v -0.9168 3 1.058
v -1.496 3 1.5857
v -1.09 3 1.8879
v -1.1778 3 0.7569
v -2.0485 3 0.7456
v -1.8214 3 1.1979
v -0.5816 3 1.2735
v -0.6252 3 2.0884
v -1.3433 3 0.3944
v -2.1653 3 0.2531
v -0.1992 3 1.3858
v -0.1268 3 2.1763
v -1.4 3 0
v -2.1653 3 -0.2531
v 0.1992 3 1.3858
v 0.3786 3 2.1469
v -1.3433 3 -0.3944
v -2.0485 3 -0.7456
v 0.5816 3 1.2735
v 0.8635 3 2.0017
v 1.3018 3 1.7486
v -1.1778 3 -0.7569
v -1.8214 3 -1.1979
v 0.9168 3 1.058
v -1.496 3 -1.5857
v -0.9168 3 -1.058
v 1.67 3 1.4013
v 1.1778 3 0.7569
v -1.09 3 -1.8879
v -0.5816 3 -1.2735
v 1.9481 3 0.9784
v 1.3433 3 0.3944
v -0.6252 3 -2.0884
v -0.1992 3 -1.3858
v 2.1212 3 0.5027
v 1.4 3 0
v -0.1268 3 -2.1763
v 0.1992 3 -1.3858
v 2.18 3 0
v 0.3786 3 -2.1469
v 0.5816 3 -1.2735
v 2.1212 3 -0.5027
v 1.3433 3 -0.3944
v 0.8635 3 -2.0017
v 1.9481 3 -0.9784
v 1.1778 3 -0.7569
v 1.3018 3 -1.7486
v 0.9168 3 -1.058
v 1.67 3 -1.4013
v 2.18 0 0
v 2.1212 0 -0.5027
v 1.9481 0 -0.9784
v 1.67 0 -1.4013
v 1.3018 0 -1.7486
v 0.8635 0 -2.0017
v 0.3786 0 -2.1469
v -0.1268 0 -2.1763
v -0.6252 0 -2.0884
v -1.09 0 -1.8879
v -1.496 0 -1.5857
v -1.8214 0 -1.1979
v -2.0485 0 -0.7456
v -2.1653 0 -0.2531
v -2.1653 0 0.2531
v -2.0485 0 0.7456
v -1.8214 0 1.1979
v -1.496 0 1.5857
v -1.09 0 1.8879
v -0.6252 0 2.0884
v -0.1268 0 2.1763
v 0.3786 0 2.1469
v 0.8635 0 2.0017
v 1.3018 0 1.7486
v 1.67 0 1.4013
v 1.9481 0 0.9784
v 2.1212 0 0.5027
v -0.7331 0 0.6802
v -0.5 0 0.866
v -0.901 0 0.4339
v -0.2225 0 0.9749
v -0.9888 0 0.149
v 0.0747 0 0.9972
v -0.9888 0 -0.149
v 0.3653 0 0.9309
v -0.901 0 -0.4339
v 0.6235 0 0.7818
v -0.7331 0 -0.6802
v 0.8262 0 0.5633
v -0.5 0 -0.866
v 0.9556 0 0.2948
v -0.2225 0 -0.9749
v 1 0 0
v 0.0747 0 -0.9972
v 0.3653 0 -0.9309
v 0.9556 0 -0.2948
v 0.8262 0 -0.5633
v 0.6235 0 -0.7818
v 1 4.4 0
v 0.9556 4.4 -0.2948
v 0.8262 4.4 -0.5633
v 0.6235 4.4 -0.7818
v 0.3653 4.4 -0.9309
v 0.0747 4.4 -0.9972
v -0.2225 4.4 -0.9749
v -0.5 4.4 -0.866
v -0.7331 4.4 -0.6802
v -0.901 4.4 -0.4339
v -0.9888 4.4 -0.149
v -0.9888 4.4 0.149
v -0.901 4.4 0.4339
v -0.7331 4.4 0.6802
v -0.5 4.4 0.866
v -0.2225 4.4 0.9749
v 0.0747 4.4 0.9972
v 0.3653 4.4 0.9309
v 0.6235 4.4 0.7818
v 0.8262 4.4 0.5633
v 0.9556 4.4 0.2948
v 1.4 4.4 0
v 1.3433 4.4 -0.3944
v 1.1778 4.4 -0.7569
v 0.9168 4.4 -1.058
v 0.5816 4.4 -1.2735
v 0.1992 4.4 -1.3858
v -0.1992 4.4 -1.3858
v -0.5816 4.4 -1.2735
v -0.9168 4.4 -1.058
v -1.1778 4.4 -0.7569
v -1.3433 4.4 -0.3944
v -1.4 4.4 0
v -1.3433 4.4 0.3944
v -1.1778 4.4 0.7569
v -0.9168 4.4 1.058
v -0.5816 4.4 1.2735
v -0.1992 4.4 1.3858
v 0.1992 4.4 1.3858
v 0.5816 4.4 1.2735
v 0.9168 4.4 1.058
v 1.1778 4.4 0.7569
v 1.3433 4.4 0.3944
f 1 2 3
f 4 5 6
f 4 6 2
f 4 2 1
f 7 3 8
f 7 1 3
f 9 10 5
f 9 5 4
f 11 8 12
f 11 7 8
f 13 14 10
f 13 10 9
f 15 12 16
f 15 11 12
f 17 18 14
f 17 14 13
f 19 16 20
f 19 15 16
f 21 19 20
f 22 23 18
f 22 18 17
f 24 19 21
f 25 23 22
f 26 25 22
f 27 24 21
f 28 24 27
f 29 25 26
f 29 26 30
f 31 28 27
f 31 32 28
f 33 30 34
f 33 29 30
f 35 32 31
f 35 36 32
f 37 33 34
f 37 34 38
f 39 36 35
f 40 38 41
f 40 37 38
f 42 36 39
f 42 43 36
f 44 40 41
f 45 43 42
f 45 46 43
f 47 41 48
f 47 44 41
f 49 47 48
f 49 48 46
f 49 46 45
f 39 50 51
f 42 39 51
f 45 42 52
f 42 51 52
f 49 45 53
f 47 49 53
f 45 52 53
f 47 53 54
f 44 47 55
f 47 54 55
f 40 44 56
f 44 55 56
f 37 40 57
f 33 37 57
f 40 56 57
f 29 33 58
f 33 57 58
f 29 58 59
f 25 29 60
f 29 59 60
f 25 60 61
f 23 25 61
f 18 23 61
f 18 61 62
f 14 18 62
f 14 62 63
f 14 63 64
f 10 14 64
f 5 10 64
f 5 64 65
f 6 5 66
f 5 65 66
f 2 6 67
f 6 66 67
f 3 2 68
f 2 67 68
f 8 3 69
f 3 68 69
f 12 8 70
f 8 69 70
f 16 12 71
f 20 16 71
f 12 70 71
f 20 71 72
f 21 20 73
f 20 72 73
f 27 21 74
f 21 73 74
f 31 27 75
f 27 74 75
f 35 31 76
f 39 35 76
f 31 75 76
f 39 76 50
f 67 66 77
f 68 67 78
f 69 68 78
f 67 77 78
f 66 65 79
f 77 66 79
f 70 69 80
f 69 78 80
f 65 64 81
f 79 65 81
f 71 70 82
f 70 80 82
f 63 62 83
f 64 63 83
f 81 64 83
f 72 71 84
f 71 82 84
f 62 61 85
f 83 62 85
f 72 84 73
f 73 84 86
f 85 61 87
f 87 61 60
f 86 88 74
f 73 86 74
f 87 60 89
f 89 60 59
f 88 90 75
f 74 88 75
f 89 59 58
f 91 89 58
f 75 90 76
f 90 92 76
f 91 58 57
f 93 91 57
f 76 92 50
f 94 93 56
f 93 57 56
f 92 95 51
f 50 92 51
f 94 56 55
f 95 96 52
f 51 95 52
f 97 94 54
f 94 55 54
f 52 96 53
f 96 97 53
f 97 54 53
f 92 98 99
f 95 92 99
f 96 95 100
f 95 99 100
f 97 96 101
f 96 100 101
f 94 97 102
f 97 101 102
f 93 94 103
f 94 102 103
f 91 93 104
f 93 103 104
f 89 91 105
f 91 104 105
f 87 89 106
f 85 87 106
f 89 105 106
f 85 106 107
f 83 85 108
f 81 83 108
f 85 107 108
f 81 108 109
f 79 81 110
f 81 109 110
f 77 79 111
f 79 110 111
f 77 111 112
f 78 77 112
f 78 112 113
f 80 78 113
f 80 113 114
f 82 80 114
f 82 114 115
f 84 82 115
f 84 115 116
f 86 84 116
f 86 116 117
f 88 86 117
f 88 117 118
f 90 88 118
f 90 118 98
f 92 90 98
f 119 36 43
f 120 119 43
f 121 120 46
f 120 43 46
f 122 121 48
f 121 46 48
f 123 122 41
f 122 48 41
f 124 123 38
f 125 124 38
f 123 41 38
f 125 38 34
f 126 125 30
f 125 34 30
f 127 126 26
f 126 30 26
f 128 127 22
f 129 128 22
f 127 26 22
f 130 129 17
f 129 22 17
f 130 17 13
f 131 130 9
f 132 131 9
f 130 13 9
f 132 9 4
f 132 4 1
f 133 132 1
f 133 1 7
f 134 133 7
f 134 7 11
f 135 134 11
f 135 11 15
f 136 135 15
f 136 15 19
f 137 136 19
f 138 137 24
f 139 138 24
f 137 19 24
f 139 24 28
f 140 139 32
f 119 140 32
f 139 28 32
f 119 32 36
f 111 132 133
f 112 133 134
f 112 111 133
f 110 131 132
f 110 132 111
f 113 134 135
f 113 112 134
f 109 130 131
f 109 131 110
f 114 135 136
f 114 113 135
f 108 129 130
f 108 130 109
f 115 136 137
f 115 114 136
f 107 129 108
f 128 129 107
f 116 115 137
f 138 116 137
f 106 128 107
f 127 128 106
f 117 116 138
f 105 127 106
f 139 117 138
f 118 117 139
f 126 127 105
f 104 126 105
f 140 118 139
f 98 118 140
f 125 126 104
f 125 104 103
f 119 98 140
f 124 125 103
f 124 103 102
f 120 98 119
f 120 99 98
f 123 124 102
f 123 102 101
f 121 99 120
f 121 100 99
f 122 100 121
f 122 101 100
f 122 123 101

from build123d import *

# Parameters (mm, degrees)
SKETCH_1_R          = 2.18
EXTRUDE_1_DEPTH     = 3
SKETCH_2_R          = 1.4
EXTRUDE_2_DEPTH     = 1.4
SKETCH_3_R          = 1
CUT_EXTRUDE_1_DEPTH = 10


with BuildPart() as part:
    # Эскиз1 → Бобышка-Вытянуть1 (new body)
    with BuildSketch(Plane(origin=(0, 0, 0), x_dir=(1, 0, 0), z_dir=(0, 1, 0))):
        Circle(SKETCH_1_R)
    extrude(amount=EXTRUDE_1_DEPTH)

    # Эскиз2 → Бобышка-Вытянуть2 (add)
    with BuildSketch(Plane(origin=(0, 3, 0), x_dir=(1, 0, 0), z_dir=(0, 1, 0))):
        Circle(SKETCH_2_R)
    extrude(amount=EXTRUDE_2_DEPTH)

    # Эскиз3 → Вырез-Вытянуть1 (cut)
    with BuildSketch(Plane(origin=(0, 4.4, 0), x_dir=(1, 0, 0), z_dir=(0, 1, 0))):
        Circle(SKETCH_3_R)
    extrude(amount=-CUT_EXTRUDE_1_DEPTH, mode=Mode.SUBTRACT)


solid = part.part
